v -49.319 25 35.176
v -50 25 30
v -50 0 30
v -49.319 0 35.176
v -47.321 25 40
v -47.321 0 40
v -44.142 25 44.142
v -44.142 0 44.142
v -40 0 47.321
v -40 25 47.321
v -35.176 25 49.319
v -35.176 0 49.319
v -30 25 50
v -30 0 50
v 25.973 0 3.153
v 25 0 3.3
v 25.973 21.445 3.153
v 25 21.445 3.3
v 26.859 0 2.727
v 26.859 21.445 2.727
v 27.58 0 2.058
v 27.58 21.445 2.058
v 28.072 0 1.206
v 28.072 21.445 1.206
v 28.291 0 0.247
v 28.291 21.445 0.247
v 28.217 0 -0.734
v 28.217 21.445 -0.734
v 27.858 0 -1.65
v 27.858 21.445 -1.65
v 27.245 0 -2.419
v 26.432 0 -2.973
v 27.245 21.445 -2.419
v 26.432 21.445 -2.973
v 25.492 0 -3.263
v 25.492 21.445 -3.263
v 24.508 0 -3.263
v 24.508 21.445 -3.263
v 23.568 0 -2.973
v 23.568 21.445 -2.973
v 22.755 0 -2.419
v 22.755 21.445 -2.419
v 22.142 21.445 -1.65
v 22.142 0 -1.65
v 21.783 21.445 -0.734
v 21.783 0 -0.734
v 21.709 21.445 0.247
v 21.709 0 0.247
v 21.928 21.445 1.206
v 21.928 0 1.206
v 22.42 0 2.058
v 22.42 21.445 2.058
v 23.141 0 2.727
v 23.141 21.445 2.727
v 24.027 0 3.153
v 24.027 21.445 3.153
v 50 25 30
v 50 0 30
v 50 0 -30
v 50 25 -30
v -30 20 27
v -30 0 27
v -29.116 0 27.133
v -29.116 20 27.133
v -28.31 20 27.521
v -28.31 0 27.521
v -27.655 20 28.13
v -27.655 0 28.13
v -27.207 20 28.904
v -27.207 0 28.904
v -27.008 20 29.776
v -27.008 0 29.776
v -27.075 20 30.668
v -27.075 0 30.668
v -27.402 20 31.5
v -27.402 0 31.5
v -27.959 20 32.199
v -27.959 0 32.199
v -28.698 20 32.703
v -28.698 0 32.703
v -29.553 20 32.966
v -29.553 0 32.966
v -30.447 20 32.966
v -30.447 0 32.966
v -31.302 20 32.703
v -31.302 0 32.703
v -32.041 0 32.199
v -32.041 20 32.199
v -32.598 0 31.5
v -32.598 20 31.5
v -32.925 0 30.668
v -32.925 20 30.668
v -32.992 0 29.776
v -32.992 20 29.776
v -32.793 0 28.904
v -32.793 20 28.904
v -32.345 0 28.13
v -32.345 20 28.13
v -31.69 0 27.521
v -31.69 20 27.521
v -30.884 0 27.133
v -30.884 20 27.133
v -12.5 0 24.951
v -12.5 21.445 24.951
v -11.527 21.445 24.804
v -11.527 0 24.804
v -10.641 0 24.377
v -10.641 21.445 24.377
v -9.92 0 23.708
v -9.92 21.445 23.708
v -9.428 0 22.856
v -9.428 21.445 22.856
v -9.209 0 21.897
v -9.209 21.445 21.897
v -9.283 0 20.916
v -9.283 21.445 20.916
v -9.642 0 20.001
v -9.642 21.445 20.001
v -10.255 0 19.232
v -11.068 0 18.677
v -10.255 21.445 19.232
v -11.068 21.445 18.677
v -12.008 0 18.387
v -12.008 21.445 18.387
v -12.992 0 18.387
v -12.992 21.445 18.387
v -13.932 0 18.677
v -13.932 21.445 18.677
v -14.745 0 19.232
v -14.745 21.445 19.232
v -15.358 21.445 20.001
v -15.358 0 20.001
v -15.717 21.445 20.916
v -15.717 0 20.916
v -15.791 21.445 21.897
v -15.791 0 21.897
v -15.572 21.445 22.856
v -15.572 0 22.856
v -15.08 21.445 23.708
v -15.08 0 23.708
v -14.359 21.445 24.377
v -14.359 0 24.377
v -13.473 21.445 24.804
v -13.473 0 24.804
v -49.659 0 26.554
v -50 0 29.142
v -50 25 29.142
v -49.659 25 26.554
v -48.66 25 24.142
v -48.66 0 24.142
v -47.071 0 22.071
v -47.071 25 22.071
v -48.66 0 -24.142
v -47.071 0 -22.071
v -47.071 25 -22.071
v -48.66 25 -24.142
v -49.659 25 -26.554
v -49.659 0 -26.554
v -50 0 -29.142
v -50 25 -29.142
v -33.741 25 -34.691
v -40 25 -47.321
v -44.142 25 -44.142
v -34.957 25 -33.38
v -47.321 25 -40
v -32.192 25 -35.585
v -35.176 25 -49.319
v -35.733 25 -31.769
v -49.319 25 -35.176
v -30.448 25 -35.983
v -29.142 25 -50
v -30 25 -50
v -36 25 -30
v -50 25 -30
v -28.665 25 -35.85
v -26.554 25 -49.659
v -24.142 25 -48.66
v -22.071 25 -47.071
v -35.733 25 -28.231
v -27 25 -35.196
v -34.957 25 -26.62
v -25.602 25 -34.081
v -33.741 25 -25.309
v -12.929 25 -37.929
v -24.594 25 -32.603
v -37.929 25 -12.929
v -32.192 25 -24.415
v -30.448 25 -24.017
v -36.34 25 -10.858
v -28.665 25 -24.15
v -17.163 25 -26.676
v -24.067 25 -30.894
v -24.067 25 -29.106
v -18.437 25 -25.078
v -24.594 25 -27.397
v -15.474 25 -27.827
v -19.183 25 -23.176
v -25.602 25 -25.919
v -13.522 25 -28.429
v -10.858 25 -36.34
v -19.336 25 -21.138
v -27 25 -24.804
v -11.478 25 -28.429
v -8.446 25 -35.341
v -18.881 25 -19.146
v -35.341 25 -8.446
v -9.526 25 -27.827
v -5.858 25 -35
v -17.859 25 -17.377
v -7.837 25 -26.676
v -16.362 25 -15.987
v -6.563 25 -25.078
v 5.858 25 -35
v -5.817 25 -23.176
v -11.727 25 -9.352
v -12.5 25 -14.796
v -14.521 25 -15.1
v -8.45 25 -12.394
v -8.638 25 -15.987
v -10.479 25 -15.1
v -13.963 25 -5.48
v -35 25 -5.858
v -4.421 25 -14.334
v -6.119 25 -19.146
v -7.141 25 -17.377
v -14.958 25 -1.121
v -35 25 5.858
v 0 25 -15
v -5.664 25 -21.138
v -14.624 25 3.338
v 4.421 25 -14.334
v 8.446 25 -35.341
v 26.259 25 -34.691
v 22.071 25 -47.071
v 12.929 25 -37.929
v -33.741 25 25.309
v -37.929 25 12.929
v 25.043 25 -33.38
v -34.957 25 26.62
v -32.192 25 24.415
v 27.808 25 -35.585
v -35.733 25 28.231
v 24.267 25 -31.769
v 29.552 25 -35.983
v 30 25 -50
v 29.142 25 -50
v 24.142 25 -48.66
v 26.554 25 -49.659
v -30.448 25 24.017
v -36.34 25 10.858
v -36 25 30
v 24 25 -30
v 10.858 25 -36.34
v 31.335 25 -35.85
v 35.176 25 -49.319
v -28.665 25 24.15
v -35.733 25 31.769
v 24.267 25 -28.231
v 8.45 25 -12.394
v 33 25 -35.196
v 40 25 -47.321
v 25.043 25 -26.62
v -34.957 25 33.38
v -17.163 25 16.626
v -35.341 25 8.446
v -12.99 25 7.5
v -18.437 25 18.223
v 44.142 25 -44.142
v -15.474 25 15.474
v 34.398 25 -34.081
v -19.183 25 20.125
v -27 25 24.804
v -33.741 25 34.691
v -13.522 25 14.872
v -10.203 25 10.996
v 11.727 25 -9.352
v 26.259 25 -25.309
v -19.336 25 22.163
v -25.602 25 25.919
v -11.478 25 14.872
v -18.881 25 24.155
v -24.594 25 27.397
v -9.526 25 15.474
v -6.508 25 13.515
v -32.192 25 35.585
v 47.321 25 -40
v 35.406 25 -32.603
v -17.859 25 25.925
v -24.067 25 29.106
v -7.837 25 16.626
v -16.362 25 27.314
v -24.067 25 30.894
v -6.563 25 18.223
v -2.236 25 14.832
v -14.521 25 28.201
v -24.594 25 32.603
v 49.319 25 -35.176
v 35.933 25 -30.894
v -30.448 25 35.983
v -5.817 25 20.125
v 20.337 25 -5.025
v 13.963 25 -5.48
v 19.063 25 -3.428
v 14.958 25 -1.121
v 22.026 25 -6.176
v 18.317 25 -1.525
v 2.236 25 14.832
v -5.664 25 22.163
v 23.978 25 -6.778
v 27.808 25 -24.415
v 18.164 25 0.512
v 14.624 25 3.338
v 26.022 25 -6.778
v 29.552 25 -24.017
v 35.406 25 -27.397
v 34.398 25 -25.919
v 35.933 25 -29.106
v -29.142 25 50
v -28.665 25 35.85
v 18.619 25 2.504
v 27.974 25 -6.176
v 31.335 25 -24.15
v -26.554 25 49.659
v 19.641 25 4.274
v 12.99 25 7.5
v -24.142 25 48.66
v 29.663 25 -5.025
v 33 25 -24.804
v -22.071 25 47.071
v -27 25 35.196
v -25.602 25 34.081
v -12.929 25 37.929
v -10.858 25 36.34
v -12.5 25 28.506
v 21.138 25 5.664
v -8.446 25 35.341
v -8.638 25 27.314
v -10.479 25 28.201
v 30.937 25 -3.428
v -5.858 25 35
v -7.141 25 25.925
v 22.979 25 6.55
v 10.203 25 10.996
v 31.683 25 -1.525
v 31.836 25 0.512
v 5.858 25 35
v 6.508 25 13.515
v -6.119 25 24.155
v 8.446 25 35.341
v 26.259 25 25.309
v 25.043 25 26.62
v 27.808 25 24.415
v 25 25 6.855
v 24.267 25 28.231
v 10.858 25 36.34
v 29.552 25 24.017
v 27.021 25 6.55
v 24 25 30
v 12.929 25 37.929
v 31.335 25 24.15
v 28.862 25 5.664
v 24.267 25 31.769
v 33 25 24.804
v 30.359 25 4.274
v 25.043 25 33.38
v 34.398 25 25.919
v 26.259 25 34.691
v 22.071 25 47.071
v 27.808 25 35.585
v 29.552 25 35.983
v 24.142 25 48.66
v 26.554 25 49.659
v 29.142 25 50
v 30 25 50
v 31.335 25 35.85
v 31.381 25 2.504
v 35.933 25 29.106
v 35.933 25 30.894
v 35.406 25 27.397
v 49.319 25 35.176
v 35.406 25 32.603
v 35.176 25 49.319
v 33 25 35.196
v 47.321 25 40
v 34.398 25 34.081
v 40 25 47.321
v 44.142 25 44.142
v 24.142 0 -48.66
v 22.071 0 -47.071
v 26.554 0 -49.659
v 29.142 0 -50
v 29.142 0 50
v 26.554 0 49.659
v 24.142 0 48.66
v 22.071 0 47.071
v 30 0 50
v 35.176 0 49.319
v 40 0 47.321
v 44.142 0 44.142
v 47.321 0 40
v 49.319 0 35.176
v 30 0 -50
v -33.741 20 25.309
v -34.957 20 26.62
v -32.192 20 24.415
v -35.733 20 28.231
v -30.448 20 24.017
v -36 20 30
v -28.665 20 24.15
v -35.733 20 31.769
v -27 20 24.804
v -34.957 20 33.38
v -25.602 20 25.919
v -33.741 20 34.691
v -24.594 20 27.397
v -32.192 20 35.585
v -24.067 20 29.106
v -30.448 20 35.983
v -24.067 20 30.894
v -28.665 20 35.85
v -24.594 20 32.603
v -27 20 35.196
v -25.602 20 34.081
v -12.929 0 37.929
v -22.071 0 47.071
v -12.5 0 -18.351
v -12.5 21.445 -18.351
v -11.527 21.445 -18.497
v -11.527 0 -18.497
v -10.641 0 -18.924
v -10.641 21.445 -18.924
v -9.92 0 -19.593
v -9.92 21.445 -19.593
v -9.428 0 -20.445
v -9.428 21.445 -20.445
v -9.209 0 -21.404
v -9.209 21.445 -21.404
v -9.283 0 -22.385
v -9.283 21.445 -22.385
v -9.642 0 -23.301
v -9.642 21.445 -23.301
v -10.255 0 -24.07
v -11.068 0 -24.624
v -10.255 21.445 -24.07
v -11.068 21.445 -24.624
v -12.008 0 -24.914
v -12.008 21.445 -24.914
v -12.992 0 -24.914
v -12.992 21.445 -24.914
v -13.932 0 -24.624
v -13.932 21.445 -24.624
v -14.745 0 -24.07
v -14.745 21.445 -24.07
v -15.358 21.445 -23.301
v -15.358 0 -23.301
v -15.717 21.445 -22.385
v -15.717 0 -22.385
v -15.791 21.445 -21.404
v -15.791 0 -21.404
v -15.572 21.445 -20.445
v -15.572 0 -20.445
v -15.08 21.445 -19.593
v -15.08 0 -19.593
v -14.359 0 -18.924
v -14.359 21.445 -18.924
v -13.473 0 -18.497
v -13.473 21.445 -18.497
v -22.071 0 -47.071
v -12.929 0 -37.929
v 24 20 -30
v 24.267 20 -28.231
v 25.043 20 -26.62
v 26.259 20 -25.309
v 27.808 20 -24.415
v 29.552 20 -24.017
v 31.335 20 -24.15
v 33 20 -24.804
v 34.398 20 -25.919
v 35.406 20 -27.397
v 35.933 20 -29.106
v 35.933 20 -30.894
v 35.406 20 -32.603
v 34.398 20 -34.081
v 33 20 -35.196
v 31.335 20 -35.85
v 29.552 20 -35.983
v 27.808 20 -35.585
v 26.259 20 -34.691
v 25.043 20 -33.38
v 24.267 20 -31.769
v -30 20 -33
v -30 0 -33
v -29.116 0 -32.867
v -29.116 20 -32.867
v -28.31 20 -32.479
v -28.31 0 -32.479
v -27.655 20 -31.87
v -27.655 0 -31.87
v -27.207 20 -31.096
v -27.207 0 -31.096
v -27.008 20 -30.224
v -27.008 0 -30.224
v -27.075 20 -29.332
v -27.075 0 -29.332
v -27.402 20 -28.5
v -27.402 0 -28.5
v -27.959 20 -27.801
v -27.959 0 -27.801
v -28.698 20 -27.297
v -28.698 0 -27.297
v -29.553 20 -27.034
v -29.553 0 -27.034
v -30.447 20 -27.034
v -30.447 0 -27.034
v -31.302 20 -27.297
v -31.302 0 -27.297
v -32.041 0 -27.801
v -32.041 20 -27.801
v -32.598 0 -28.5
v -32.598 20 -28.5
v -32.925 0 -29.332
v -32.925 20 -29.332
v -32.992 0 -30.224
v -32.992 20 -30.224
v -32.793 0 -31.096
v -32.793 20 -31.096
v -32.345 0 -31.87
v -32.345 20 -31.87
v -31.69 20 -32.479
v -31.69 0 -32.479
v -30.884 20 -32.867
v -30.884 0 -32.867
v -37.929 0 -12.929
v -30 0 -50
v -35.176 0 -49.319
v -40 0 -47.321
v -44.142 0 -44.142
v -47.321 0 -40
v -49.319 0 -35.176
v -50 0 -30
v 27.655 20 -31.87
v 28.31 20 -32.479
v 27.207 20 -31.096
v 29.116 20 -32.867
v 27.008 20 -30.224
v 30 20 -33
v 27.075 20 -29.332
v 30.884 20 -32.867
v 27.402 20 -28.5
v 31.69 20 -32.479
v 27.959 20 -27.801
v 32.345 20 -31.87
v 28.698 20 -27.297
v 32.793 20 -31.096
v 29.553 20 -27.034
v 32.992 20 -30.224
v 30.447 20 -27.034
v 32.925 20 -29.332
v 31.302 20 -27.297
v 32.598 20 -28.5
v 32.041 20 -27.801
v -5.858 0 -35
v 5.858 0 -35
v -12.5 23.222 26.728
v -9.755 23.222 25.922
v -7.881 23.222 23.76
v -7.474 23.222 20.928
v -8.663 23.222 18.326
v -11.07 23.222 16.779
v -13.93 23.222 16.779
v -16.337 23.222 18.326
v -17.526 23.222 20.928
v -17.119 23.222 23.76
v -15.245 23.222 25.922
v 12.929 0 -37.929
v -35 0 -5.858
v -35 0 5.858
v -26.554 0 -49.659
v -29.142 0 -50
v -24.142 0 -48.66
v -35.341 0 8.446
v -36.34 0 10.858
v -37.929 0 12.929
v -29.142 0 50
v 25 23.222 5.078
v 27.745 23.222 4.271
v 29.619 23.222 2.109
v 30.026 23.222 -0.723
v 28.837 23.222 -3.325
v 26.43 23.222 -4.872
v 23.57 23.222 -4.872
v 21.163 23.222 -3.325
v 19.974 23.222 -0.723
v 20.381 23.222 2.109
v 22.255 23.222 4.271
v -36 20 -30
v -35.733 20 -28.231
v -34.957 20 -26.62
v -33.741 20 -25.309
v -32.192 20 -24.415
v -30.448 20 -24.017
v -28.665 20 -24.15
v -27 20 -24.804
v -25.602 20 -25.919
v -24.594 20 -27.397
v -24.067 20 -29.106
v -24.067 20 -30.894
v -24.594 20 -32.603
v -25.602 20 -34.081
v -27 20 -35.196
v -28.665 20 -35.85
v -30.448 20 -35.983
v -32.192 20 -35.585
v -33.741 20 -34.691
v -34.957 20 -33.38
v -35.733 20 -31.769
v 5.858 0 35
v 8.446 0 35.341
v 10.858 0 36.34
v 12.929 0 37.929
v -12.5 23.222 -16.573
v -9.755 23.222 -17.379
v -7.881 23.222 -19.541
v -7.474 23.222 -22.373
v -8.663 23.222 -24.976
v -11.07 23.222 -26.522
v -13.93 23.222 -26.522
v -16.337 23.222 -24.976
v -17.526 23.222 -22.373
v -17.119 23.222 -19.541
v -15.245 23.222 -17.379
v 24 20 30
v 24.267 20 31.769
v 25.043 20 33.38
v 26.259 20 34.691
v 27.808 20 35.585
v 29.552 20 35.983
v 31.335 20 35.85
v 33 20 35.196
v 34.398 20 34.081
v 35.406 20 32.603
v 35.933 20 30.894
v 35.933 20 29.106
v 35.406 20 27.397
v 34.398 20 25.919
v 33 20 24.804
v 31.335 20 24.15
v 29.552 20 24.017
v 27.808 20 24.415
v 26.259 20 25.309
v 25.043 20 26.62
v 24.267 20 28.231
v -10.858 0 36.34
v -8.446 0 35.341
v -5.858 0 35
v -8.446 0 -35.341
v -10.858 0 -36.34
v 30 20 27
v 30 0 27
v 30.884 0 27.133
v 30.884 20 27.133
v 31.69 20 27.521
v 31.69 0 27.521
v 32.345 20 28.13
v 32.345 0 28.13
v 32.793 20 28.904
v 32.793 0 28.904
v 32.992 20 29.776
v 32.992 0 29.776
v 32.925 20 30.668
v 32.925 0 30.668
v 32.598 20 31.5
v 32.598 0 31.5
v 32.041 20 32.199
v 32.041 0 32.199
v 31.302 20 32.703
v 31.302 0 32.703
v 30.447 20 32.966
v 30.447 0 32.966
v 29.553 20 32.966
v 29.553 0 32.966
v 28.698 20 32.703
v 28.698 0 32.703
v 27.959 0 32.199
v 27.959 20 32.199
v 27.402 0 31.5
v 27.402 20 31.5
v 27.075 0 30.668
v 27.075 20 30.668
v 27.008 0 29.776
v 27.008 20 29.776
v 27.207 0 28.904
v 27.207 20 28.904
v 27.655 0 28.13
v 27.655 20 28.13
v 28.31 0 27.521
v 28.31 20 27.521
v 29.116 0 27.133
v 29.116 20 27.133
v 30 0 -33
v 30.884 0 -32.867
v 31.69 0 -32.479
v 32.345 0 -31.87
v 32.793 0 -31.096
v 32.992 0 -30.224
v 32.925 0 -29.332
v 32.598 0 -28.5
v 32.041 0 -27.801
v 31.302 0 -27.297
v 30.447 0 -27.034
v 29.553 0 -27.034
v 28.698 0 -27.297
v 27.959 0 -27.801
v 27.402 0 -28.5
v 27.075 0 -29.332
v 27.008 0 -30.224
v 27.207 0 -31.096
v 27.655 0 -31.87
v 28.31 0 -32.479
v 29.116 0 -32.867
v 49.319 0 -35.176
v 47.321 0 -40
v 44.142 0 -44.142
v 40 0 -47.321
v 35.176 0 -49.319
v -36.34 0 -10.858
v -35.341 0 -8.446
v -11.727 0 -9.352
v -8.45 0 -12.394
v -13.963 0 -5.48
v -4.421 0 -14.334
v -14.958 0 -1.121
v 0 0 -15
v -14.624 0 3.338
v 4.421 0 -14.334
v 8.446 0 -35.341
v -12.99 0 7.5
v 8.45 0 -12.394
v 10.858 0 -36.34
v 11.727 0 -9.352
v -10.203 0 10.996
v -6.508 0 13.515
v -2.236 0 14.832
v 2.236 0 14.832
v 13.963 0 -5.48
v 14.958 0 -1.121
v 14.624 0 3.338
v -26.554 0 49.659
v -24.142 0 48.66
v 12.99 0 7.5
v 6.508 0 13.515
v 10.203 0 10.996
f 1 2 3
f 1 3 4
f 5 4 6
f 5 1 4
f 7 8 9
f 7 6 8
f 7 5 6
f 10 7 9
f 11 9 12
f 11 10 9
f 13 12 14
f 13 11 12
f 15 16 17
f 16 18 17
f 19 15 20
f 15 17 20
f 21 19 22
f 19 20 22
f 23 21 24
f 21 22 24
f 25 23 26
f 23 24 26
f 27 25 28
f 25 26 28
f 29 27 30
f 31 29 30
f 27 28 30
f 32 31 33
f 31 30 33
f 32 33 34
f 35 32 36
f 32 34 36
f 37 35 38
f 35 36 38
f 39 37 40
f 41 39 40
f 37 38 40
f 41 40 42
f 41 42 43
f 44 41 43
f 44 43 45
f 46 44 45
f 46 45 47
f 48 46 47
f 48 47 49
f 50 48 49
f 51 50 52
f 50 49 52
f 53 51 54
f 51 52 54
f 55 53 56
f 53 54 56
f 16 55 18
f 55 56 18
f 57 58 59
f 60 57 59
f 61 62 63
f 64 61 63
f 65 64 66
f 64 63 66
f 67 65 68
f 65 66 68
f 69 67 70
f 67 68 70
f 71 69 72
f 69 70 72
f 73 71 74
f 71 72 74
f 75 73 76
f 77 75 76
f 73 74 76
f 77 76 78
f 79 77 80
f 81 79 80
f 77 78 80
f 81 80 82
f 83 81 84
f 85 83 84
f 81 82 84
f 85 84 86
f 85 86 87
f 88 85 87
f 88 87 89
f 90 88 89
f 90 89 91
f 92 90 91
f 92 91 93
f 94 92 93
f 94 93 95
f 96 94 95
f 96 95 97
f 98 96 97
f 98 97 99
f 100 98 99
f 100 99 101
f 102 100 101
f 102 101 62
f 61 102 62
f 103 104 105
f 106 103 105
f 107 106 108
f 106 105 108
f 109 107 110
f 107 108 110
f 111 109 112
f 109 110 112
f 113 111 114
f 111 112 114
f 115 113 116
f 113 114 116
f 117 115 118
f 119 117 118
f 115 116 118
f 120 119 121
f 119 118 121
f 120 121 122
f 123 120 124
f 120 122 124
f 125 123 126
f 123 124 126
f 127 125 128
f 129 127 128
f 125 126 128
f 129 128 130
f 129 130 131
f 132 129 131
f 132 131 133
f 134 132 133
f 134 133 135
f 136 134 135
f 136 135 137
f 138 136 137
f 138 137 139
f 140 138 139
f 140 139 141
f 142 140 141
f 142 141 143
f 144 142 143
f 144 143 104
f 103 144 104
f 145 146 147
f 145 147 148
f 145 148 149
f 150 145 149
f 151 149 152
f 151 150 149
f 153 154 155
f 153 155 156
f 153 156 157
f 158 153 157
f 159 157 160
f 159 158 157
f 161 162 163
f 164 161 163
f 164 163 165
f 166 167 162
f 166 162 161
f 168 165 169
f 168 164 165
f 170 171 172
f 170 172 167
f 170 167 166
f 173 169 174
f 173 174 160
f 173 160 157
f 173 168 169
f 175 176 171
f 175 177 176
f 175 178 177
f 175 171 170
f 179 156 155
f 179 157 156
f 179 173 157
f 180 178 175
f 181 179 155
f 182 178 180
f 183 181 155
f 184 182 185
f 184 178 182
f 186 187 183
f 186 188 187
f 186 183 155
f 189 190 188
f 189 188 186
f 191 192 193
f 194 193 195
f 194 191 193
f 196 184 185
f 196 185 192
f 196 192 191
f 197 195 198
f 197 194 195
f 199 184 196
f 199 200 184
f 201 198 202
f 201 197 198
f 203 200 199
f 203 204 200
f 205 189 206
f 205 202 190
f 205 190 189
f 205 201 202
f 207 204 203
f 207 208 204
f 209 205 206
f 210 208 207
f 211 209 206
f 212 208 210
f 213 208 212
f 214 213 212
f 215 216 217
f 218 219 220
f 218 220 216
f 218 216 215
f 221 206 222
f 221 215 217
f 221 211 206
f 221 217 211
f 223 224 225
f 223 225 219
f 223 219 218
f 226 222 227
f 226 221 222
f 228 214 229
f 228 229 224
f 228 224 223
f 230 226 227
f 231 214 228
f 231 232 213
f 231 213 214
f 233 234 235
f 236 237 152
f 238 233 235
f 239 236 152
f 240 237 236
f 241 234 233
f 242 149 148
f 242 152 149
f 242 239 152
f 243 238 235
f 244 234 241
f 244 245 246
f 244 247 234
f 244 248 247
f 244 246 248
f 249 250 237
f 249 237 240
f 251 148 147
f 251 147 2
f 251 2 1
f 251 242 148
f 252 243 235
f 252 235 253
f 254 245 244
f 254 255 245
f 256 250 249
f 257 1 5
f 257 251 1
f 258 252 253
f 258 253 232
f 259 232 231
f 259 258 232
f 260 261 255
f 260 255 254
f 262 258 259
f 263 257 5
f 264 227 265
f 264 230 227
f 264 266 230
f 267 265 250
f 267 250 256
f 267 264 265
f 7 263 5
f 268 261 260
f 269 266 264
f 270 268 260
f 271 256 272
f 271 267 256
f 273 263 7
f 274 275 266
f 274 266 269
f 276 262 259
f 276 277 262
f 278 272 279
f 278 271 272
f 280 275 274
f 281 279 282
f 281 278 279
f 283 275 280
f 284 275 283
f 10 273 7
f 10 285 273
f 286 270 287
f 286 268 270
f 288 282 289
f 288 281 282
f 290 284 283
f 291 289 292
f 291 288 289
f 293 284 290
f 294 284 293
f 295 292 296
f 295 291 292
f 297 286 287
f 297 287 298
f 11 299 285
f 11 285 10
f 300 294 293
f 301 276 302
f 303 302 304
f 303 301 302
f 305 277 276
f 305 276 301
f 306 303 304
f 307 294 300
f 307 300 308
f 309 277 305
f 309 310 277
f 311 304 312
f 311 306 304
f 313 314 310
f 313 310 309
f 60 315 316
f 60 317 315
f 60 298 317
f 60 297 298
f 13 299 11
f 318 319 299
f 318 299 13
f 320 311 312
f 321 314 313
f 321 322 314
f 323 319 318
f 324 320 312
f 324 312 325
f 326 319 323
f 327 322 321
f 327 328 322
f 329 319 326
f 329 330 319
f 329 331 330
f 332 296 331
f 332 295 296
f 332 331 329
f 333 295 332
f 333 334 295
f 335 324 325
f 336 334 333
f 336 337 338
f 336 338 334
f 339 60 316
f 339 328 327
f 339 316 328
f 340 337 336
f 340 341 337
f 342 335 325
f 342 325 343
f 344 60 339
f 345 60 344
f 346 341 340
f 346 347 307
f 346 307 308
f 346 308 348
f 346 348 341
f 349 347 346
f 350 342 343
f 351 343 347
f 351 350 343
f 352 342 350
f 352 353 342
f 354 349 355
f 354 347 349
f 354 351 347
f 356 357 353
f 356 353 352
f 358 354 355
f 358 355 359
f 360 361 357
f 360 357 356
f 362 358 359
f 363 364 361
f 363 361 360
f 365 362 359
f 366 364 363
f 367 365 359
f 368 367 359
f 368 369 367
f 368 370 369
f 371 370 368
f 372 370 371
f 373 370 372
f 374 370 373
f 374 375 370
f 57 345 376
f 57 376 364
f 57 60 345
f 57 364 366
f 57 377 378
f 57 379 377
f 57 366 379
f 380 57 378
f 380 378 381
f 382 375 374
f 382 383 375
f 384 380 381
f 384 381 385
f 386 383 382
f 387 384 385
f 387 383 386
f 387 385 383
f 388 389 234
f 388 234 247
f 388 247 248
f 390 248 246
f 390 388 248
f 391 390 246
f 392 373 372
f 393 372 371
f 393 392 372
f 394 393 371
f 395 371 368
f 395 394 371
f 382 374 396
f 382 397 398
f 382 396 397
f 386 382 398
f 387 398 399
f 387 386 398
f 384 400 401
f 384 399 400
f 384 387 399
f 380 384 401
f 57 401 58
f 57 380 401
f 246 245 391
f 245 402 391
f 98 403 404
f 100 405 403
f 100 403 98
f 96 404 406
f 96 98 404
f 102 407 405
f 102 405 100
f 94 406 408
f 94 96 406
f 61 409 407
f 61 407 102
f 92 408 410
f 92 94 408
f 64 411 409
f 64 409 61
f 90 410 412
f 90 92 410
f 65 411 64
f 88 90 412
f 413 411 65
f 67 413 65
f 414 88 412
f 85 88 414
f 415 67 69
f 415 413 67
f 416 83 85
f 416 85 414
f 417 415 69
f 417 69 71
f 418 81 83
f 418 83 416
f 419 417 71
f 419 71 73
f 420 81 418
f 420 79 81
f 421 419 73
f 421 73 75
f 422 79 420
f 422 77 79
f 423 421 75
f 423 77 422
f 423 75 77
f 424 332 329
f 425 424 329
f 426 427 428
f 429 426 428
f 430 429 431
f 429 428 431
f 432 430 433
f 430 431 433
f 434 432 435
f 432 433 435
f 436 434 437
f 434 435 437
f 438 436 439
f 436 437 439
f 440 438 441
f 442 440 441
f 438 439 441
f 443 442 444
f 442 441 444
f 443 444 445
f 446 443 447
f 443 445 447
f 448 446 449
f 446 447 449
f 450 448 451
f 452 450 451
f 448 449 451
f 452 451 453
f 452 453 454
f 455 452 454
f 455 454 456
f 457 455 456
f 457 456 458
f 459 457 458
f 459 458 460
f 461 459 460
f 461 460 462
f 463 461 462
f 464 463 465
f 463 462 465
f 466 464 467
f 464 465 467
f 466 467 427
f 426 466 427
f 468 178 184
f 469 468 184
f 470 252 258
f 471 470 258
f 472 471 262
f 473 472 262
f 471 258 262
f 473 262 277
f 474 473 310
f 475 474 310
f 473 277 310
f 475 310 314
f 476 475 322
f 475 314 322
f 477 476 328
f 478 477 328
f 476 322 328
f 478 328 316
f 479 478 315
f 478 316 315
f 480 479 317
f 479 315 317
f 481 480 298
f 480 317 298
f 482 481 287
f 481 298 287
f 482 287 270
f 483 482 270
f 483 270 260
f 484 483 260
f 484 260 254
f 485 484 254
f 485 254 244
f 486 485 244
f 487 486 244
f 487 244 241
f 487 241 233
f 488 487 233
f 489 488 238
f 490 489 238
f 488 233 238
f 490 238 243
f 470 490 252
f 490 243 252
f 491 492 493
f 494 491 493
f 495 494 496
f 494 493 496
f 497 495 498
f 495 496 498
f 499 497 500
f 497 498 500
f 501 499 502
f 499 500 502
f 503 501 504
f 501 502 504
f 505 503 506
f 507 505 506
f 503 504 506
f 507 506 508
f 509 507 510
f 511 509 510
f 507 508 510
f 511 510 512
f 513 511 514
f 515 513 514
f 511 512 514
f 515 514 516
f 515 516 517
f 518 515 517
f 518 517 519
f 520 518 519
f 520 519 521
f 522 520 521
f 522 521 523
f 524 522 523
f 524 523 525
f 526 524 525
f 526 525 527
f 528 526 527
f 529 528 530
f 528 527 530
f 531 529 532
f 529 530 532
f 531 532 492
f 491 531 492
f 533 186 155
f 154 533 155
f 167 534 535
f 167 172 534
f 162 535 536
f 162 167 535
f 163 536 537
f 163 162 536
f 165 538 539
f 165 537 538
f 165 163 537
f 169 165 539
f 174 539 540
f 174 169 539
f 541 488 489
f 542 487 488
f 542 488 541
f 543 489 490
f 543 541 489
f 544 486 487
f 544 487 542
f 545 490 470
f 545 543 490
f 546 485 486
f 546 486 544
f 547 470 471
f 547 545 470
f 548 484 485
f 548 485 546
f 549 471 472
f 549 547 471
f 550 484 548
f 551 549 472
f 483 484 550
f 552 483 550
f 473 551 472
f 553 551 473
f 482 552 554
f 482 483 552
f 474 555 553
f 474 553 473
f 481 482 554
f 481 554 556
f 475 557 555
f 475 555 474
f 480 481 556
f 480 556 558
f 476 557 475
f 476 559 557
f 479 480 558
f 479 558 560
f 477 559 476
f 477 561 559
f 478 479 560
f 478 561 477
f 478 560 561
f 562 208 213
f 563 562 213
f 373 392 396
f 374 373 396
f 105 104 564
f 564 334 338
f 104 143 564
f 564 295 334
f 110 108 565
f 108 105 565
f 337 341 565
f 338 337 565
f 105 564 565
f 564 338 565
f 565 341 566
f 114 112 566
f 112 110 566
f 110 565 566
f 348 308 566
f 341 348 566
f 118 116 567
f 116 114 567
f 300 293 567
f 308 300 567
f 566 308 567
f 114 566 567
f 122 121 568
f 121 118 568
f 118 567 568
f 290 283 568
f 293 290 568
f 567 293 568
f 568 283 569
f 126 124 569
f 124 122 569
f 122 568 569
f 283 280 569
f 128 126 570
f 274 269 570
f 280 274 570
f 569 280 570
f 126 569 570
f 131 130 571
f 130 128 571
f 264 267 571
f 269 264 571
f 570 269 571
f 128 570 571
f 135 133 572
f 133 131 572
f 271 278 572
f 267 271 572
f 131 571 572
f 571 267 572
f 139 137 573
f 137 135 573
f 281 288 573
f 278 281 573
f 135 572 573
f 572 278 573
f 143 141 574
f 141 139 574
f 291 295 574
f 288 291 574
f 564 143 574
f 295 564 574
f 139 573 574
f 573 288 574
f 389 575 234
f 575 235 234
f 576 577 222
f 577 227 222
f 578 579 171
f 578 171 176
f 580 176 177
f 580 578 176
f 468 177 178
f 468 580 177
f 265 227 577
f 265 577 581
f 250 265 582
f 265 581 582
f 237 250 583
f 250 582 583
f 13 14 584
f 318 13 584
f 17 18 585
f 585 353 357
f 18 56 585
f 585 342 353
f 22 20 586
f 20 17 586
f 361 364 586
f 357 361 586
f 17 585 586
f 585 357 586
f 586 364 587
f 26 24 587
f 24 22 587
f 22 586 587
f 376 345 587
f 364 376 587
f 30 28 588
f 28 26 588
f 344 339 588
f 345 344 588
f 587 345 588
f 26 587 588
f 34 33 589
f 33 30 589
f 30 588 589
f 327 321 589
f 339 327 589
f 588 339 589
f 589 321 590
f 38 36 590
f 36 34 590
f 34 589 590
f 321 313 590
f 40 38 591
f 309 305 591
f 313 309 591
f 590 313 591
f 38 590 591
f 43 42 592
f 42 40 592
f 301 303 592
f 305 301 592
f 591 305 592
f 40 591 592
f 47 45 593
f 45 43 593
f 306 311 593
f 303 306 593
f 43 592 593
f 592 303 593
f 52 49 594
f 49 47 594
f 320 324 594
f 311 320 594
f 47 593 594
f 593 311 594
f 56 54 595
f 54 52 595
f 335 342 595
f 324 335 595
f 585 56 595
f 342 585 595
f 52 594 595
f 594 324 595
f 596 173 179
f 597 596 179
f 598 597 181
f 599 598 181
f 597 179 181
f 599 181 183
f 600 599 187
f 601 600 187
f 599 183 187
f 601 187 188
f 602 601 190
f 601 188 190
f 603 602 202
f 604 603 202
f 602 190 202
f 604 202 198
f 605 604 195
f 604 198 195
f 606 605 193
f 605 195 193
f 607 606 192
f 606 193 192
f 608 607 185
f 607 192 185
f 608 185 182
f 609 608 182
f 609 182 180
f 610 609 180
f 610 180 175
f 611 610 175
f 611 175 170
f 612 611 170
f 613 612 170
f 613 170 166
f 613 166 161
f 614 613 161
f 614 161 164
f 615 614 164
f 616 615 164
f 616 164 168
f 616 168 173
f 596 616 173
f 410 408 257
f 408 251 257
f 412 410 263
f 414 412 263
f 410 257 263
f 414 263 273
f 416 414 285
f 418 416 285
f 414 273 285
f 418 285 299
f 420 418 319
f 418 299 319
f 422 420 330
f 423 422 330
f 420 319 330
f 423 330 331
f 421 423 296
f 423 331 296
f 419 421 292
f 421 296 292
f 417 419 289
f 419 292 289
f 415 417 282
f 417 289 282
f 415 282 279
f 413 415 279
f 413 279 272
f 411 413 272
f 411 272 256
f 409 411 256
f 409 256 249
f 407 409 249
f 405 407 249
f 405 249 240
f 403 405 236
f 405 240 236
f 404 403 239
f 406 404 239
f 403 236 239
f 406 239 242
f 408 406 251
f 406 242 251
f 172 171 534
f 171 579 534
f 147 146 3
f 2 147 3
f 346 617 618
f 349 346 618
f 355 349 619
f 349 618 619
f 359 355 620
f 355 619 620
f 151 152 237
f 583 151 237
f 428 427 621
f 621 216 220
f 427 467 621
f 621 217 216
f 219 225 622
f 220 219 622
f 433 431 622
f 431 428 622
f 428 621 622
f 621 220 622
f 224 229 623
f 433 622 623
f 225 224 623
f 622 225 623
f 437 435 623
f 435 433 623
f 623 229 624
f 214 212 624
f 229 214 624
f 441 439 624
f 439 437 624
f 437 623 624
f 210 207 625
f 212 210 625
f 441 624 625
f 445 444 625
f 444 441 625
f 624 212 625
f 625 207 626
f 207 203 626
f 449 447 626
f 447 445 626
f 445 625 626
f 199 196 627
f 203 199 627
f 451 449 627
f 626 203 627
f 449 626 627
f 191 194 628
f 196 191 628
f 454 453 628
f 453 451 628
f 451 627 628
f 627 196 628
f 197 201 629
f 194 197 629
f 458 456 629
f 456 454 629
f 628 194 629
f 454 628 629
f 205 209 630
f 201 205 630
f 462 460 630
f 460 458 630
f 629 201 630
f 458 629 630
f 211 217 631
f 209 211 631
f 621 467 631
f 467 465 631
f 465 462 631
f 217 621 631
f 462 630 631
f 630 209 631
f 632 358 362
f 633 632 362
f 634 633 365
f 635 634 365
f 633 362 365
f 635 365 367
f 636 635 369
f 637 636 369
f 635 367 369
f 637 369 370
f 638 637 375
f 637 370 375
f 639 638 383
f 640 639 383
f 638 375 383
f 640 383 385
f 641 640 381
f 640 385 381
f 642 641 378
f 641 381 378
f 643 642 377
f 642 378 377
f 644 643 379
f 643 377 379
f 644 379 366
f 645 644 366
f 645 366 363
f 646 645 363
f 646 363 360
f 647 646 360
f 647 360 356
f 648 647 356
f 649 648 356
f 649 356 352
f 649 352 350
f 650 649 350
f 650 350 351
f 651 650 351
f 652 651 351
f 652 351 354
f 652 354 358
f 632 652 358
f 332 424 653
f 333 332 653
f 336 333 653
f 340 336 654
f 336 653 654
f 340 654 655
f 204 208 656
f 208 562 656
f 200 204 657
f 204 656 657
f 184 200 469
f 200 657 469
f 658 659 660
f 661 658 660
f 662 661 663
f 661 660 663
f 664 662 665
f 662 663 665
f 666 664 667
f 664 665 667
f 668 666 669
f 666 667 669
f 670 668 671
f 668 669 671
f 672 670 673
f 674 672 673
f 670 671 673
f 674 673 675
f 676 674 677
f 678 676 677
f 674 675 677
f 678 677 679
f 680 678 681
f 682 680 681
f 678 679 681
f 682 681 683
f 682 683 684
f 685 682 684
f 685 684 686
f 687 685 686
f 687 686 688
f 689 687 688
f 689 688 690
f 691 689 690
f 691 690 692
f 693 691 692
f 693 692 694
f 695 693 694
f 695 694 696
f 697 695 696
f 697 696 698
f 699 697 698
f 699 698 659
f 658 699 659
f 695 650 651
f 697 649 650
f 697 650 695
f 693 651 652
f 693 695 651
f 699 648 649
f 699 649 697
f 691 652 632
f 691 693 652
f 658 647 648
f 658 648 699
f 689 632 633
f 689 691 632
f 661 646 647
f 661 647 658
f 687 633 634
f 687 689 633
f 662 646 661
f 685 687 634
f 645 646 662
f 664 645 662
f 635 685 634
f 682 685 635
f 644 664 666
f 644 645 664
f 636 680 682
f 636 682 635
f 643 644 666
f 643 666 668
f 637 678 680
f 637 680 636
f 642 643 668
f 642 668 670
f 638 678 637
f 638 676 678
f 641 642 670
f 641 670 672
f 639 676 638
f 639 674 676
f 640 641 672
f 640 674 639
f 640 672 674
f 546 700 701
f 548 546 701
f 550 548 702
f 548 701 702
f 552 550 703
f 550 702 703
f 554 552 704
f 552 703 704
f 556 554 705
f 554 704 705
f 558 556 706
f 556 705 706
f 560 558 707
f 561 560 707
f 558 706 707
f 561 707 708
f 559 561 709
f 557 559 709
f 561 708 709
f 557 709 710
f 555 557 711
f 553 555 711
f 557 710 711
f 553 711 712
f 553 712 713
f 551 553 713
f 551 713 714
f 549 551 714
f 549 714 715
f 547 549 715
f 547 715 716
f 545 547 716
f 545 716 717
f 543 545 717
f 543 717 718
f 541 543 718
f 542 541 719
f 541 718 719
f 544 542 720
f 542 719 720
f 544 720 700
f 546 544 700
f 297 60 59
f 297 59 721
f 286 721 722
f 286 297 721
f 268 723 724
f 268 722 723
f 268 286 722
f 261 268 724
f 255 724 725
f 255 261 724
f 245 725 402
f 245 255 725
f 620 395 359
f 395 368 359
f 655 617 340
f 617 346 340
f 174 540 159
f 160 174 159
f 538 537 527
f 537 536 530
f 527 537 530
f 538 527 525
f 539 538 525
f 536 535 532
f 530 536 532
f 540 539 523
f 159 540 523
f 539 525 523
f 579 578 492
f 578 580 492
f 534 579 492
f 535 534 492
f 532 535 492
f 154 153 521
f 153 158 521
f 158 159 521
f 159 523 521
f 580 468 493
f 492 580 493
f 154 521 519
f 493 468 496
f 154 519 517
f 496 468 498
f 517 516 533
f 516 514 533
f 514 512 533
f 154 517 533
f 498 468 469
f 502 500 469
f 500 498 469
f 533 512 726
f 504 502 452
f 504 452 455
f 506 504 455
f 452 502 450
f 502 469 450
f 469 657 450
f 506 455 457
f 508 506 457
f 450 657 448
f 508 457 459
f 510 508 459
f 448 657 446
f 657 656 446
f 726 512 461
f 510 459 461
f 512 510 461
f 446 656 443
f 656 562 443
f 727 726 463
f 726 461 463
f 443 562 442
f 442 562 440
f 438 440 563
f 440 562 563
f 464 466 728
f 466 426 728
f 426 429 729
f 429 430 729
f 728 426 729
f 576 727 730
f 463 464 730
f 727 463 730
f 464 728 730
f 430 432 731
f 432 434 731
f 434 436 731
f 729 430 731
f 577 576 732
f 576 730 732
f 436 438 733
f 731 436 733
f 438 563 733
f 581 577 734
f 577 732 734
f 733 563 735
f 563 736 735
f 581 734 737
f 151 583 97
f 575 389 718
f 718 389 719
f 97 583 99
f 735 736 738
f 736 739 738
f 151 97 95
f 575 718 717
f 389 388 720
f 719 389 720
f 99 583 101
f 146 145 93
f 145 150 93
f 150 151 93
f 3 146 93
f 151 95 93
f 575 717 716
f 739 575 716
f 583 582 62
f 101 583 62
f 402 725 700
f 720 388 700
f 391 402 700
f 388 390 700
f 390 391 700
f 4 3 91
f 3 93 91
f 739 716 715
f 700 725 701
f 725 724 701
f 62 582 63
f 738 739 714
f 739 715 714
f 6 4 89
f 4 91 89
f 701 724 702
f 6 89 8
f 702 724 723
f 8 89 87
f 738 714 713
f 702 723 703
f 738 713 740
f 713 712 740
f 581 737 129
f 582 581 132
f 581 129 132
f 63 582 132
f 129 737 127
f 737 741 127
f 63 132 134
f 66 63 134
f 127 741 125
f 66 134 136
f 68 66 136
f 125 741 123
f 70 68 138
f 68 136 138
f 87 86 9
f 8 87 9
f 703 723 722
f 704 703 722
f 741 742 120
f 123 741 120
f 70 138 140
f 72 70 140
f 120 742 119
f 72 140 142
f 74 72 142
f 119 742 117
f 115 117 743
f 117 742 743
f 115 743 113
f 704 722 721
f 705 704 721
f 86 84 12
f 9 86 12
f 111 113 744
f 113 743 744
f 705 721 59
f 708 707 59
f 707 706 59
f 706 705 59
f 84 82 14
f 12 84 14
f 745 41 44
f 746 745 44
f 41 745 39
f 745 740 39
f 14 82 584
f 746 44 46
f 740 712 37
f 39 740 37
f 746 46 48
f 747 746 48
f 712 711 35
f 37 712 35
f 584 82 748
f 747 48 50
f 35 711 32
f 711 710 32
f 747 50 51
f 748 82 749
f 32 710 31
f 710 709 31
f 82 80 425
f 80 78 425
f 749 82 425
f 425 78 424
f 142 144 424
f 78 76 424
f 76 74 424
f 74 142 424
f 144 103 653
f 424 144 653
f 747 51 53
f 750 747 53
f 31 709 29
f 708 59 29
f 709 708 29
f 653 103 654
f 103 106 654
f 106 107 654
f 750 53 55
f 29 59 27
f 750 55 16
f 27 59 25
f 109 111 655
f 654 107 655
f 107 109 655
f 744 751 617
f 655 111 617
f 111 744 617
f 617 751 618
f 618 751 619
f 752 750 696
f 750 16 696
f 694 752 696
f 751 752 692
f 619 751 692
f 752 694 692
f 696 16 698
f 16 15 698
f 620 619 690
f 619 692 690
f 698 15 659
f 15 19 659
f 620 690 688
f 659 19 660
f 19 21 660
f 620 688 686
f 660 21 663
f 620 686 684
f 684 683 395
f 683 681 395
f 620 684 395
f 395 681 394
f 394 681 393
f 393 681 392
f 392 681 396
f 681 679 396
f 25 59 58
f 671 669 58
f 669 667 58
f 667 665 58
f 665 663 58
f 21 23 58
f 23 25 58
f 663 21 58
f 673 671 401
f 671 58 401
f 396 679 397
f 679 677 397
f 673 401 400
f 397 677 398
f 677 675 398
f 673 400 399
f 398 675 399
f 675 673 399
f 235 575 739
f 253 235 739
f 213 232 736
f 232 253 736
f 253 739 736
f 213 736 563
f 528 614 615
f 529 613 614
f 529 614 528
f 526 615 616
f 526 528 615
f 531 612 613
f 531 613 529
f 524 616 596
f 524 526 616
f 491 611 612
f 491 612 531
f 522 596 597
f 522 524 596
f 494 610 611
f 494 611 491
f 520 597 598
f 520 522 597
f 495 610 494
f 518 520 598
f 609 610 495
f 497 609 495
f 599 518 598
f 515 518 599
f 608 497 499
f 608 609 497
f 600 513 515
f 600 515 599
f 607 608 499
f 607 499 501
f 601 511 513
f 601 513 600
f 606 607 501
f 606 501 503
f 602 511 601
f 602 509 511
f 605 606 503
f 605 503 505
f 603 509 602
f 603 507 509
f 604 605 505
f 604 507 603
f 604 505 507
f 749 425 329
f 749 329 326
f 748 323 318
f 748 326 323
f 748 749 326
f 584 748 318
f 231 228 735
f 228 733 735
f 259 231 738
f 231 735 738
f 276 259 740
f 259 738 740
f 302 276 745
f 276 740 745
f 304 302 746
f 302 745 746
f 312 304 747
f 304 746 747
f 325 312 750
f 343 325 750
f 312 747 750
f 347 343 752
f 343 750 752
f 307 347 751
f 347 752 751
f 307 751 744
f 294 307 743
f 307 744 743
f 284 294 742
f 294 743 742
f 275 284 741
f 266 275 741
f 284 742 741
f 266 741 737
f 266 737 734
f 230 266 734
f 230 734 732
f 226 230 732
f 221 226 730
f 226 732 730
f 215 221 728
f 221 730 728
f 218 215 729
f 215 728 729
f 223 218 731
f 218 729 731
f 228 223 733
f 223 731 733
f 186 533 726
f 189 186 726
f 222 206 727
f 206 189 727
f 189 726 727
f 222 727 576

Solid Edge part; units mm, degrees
sketch "Sketch1" plane through (0, 0, 0) normal (0, -1, 0) x (1, 0, 0)
  line L0 (-50, 50) -> (50, 50)
  line L1 (50, 50) -> (50, -50)
  line L2 (50, -50) -> (-50, -50)
  line L3 (-50, -50) -> (-50, 50)
  dimension "D1" = 100
  dimension "D2" = 100
extrude "Protrusion1" add sketch "Sketch1" against normal blind 25
hole "Bohrung_1" at (0, 0, 0) direction (0, 1, 0) diameter 30 end up to next
hole "Bohrung_2" at (-30, 0, 30) direction (0, 1, 0) diameter 6 end up to next
hole "Hole1" at (30, 0, 30) direction (0, 1, 0) diameter 6 end up to next
hole "Hole2" at (30, 0, -30) direction (0, 1, 0) diameter 6 end up to next
hole "Hole3" at (-30, 0, -30) direction (0, 1, 0) diameter 6 end up to next
hole "Bohrung_6" at (25, 25, 0) direction (0, -1, 0) diameter 6.6 end up to next countersink diameter 13.71 countersink angle 90
hole "Hole4" at (-12.5, 25, 21.6506) direction (0, -1, 0) diameter 6.6 end up to next countersink diameter 13.71 countersink angle 90
hole "Hole5" at (-12.5, 25, -21.6506) direction (0, -1, 0) diameter 6.6 end up to next countersink diameter 13.71 countersink angle 90
sketch "Sketch2" plane through (0, 25, 0) normal (0, 1, 0) x (-1, 0, 0)
  circle A0 centre (-30, 30) radius 6
  circle A1 centre (30, 30) radius 6
  circle A2 centre (30, -30) radius 6
  circle A3 centre (-30, -30) radius 6
  dimension "D1" = 12
extrude "Extrusionsausschnitt_2" cut sketch "Sketch2" against normal blind 5
sketch "Sketch3" plane through (0, 25, 0) normal (0, 1, 0) x (-1, 0, 0)
  line L0 (-25, 50) -> (-10, 35)
  line L1 (-10, 35) -> (10, 35)
  line L2 (10, 35) -> (25, 50)
  line L3 (25, 50) -> (-25, 50)
  line L4 (50, 25) -> (35, 10)
  line L5 (35, 10) -> (35, -10)
  line L6 (35, -10) -> (50, -25)
  line L7 (50, 25) -> (50, -25)
  line L8 (25, -50) -> (10, -35)
  line L9 (10, -35) -> (-10, -35)
  line L10 (-10, -35) -> (-25, -50)
  line L11 (-25, -50) -> (25, -50)
extrude "Extrusionsausschnitt_3" cut sketch "Sketch3" against normal blind 2384.1506
fillet "Verrundung_1" radius 20 4 edges at (50, 12.5, 50) (-50, 12.5, 50) (-50, 12.5, -50) (50, 12.5, -50)
fillet "Verrundung_2" radius 10 12 edges at (-10, 12.5, 35) (10, 12.5, 35) (-25, 12.5, 50) (25, 12.5, 50) (-50, 12.5, 25) (-35, 12.5, 10) (-35, 12.5, -10) (-50, 12.5, -25) (-25, 12.5, -50) (-10, 12.5, -35) (10, 12.5, -35) (25, 12.5, -50)
